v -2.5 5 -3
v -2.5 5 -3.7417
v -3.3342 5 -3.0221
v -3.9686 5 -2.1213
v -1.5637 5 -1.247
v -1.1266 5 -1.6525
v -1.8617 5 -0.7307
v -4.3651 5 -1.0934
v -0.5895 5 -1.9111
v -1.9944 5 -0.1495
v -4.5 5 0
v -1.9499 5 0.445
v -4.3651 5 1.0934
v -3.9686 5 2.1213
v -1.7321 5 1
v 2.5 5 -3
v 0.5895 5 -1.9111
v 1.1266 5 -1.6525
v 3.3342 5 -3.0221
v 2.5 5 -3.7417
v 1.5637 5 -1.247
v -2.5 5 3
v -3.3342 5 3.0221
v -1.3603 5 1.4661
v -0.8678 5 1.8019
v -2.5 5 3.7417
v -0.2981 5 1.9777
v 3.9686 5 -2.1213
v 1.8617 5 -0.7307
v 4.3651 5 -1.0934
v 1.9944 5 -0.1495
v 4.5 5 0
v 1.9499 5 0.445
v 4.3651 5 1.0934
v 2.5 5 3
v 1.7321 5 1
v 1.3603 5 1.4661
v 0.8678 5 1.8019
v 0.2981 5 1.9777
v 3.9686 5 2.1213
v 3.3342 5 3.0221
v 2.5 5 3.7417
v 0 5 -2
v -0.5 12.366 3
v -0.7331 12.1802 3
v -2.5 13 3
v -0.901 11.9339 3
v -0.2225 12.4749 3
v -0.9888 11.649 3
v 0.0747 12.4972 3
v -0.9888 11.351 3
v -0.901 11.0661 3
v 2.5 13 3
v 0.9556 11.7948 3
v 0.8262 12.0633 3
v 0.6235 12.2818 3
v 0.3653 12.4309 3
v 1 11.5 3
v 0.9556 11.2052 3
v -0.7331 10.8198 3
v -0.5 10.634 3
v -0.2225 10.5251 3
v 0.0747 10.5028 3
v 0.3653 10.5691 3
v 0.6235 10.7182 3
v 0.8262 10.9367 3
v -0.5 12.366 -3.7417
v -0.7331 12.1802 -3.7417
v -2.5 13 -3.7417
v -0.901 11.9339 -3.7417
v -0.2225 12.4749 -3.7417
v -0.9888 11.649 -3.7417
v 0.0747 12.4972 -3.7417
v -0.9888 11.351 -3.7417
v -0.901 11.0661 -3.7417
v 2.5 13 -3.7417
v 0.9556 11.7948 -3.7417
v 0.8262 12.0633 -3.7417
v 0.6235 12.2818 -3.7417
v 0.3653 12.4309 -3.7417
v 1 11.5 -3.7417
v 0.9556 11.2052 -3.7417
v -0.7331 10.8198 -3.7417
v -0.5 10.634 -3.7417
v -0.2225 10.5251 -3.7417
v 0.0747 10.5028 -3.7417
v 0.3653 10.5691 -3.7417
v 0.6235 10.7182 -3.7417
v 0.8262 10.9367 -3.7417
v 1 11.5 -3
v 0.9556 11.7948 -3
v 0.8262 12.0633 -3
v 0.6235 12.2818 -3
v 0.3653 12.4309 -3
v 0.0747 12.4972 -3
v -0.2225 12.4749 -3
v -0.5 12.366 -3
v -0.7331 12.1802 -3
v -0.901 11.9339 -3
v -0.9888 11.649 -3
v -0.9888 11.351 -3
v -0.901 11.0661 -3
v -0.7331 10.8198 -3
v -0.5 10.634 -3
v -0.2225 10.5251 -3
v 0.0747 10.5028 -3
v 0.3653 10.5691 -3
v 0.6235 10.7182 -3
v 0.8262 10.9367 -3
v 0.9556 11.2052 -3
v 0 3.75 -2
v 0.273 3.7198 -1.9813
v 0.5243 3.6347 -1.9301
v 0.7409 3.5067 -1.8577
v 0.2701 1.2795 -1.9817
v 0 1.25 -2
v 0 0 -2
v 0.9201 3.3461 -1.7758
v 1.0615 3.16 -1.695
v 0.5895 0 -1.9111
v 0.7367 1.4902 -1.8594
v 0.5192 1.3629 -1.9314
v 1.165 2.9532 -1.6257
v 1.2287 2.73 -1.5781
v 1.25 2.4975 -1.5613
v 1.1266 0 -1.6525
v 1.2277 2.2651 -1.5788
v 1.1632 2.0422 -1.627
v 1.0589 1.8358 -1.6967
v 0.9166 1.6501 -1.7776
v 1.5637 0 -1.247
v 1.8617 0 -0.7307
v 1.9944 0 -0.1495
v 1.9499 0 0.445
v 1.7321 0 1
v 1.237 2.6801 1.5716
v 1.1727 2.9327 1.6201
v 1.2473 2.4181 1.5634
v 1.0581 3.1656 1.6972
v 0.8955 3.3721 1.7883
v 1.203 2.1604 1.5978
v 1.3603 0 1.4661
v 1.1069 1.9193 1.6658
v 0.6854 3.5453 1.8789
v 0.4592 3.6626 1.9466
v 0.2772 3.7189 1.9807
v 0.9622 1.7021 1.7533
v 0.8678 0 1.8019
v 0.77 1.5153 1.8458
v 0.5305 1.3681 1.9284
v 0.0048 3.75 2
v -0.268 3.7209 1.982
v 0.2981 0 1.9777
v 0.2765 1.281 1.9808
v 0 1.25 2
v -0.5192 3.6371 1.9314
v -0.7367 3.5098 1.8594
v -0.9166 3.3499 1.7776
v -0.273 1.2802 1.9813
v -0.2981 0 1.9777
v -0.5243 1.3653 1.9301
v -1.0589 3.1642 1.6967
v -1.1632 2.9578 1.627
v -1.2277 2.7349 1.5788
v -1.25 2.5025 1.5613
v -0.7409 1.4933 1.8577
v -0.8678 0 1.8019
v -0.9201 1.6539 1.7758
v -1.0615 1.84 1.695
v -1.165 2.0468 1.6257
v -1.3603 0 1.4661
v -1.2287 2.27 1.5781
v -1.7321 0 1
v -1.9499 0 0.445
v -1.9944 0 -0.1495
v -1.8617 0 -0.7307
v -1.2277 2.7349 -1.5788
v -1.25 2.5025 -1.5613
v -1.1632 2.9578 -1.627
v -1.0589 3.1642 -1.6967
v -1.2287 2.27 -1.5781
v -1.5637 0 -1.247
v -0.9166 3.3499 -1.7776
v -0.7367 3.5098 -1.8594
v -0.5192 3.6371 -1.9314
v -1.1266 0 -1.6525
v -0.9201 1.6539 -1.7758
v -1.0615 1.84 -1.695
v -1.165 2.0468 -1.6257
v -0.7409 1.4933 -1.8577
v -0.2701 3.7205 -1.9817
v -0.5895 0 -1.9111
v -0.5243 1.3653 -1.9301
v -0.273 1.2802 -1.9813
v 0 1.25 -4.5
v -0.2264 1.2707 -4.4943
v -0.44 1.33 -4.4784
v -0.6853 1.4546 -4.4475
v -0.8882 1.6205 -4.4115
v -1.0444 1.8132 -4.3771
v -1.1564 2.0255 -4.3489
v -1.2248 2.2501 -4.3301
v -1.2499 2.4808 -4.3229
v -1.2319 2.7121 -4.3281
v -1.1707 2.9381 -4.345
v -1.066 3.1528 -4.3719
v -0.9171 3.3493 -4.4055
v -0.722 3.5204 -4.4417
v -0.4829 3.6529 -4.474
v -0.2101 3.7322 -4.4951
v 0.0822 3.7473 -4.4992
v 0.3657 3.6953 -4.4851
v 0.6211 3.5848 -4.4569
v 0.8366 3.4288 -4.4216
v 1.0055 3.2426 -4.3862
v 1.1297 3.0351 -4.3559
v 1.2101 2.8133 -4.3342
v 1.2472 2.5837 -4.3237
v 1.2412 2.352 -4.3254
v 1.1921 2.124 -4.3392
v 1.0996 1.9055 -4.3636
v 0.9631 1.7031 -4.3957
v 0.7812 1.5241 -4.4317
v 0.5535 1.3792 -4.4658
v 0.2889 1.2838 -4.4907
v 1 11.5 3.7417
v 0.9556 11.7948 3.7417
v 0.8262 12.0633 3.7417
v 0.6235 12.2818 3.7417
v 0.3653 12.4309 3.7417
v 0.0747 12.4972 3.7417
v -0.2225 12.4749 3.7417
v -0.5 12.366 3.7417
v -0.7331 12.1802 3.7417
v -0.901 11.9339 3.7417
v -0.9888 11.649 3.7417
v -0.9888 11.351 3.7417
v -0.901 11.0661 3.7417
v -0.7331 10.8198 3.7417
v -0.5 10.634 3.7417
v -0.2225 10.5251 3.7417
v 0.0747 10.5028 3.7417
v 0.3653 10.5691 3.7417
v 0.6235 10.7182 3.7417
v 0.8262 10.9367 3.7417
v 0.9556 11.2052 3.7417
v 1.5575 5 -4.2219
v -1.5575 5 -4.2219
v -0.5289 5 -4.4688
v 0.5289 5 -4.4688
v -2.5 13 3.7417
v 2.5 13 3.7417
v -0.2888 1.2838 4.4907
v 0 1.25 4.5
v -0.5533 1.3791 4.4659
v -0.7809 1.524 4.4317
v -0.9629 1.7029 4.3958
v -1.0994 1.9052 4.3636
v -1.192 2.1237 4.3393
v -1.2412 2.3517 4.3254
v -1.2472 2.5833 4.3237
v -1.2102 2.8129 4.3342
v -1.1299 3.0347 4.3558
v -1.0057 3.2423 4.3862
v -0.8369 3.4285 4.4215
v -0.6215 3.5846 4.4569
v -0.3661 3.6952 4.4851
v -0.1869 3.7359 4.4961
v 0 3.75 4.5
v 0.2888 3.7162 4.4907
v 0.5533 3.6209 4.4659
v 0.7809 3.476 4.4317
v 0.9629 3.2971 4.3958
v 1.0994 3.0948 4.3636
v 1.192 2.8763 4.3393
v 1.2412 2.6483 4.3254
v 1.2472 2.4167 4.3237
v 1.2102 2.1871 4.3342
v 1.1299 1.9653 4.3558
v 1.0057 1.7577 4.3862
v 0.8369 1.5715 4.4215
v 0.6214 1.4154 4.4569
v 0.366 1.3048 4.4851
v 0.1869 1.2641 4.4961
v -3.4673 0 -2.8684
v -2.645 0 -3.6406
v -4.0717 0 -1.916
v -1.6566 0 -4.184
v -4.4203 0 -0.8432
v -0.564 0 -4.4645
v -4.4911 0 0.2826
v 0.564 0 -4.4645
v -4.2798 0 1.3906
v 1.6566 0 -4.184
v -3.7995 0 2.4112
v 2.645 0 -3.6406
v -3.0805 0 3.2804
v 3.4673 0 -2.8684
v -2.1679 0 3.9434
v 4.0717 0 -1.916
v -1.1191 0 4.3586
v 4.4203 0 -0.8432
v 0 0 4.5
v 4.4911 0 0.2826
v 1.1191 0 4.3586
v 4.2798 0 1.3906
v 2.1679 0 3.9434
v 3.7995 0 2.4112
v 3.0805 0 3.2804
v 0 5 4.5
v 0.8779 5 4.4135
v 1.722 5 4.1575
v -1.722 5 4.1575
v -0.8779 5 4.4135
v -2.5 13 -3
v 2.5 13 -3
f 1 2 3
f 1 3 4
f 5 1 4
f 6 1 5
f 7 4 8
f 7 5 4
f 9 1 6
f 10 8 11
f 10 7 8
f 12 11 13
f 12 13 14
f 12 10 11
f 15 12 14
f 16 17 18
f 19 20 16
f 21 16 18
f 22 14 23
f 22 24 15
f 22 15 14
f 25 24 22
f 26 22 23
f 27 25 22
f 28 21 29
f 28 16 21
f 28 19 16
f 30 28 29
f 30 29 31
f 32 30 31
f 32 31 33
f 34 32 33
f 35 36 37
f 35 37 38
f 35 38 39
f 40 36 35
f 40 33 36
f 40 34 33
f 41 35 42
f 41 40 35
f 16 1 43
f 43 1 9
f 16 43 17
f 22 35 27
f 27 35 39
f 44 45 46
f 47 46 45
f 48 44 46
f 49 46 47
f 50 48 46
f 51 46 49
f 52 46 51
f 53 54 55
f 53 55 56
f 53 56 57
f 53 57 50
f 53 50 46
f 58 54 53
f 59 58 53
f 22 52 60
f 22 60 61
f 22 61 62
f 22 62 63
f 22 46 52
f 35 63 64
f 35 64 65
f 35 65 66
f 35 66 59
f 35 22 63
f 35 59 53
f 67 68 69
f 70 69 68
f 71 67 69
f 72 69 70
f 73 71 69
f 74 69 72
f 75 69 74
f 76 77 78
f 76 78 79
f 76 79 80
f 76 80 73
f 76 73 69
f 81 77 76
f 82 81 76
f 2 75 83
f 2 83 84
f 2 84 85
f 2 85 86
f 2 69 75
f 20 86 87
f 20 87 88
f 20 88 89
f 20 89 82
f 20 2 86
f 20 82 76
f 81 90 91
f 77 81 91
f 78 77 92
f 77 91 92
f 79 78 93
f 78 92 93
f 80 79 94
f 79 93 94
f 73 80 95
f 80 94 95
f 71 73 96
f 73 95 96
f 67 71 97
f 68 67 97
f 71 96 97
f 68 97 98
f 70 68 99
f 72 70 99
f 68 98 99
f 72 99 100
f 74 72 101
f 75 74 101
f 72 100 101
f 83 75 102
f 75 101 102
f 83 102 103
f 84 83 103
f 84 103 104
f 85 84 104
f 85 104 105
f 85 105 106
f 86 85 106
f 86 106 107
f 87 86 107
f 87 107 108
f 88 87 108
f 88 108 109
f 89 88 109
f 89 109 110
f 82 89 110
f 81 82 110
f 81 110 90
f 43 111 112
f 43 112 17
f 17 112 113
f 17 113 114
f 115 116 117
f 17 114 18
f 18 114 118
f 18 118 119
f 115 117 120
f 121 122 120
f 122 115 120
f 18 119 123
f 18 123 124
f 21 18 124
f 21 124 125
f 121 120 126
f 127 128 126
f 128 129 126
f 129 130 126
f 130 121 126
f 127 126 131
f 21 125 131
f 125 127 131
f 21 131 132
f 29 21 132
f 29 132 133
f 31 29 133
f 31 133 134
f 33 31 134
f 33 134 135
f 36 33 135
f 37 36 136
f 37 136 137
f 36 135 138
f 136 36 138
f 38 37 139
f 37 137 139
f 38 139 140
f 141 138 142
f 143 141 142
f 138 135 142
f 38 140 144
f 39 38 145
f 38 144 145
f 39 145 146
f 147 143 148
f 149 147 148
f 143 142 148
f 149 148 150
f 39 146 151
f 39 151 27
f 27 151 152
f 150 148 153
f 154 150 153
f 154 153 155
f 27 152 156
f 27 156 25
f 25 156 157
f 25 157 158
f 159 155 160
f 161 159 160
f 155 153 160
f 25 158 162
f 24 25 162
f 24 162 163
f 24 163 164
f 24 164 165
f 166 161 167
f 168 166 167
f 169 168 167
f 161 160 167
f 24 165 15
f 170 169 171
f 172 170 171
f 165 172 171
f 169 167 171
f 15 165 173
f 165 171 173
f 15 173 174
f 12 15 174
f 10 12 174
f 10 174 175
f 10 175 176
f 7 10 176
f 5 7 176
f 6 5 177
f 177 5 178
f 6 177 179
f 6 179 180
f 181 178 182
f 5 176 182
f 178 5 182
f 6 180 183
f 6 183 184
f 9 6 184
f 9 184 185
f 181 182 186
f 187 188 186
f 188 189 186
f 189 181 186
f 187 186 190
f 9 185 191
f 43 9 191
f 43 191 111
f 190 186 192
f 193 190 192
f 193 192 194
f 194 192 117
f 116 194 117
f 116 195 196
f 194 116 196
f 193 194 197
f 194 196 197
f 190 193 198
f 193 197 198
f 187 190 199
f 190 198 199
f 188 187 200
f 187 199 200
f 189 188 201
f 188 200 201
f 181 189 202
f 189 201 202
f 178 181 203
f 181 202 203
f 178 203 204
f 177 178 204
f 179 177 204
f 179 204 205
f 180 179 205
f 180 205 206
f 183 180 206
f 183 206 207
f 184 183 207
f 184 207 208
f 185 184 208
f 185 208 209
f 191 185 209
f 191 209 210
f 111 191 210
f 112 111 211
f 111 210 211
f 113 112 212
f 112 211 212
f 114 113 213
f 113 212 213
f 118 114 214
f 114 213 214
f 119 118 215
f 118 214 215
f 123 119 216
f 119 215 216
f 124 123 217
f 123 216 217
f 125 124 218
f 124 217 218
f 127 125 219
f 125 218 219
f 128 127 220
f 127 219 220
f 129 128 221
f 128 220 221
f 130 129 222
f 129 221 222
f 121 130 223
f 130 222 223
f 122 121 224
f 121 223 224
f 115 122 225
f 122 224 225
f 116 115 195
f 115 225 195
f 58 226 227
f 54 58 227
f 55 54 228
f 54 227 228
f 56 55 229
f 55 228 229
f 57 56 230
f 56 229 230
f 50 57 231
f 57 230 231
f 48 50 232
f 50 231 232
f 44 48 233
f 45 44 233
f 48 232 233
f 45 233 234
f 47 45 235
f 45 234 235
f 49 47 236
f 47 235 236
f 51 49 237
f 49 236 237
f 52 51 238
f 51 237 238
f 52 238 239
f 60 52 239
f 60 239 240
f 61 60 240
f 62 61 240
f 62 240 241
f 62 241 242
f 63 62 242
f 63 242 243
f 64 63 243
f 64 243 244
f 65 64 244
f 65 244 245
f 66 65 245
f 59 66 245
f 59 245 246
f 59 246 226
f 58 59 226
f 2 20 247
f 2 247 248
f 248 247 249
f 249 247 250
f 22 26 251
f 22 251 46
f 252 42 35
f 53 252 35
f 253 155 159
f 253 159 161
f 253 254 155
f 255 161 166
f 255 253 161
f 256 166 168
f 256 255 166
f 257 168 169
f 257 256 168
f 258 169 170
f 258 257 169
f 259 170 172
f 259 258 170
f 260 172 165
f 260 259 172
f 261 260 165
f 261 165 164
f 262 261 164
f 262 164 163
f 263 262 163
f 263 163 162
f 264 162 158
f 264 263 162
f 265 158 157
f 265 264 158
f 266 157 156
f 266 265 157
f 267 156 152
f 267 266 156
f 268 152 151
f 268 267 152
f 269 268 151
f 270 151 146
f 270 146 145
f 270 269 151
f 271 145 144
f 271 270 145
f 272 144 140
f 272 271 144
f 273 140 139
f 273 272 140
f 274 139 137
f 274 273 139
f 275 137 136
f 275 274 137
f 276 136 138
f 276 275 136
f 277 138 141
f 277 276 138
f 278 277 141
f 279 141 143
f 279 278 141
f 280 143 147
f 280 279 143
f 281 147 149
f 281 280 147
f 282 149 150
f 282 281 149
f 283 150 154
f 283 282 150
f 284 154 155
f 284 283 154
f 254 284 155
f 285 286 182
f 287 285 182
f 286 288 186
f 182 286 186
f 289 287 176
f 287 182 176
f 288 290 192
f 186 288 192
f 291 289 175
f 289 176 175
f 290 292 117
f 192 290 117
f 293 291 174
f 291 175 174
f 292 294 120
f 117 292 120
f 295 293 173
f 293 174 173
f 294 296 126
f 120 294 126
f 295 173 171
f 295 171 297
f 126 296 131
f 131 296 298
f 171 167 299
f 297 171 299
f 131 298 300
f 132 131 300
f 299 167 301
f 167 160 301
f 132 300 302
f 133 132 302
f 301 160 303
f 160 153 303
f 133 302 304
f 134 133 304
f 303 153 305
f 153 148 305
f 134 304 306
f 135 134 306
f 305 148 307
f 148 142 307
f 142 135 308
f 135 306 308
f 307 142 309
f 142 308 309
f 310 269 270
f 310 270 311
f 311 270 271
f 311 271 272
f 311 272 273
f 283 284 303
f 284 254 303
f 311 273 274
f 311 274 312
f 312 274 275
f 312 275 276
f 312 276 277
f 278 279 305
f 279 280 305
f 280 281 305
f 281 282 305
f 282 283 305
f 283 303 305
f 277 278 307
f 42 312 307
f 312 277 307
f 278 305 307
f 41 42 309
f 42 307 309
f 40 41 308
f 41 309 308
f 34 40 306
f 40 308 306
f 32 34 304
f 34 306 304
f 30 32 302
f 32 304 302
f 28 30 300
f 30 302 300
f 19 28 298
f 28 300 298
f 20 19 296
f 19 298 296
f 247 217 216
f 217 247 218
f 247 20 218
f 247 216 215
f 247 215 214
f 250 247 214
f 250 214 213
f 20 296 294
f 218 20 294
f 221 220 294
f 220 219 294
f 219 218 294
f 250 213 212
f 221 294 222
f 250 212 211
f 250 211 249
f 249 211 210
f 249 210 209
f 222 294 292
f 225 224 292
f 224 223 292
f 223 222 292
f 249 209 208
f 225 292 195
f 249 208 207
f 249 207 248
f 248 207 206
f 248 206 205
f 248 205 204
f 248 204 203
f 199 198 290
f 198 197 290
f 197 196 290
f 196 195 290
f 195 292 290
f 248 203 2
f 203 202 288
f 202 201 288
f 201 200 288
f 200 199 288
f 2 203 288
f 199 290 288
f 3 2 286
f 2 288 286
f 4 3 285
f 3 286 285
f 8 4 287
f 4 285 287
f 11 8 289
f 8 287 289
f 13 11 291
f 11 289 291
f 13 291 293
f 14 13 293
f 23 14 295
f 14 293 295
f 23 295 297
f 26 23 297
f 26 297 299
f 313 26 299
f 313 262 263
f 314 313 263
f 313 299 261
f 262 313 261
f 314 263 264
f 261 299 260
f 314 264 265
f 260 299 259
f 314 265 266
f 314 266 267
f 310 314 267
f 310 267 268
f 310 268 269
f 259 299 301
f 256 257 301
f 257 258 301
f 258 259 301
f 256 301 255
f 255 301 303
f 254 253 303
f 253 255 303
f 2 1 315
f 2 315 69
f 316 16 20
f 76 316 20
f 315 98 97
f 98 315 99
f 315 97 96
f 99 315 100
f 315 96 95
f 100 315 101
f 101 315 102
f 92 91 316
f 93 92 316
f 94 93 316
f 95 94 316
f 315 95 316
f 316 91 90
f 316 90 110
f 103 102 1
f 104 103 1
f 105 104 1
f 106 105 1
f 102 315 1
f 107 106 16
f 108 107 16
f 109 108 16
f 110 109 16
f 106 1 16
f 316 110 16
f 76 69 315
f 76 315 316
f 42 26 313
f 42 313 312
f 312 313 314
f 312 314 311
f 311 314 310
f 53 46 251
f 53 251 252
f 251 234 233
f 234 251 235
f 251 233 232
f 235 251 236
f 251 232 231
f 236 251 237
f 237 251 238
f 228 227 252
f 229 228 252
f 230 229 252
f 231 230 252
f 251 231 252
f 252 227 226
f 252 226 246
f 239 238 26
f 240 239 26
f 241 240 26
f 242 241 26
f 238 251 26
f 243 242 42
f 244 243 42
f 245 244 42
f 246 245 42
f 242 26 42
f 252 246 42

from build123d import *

# Parameters (mm, degrees)
SKETCH2_R           = 4.5
BOSS_EXTRUDE1_DEPTH = 5
SKETCH3_W           = 5
SKETCH3_H           = 0.741657387
BOSS_EXTRUDE2_DEPTH = 8
CUT_EXTRUDE1_REACH  = 18.037
SKETCH4_R           = 1
SKETCH6_R           = 2
CUT_EXTRUDE2_DEPTH  = 5


with BuildPart() as part:
    # Sketch2 → Boss-Extrude1 (new body)
    with BuildSketch(Plane(origin=(0, 0, 0), x_dir=(1, 0, 0), z_dir=(0, 1, 0))):
        with Locations(Location((0, 0, 0), (0, 0, 270))):
            Circle(SKETCH2_R)
    extrude(amount=BOSS_EXTRUDE1_DEPTH)

    # Sketch3 → Boss-Extrude2 (add)
    with BuildSketch(Plane(origin=(0, 5, 0), x_dir=(1, 0, 0), z_dir=(0, 1, 0))):
        with Locations((0, -3.370828694)):
            Rectangle(SKETCH3_W, SKETCH3_H)
        with Locations((0, 3.370828694)):
            Rectangle(SKETCH3_W, SKETCH3_H)
    extrude(amount=BOSS_EXTRUDE2_DEPTH)

    # Cut-Extrude1: up to this face of the body (flat: up to its plane)
    cut_extrude1_end = Plane(part.part.faces().sort_by_distance((0, 9, -3.741657387))[0])
    # Sketch4 → Cut-Extrude1 (cut, up to the picked face)
    with BuildSketch(Plane.XY.offset(3.741657387), mode=Mode.PRIVATE) as cut_extrude1_sk1:
        with Locations((0, 11.5)):
            Circle(SKETCH4_R)
    cut_extrude1_tool1 = split(extrude(cut_extrude1_sk1.sketch, amount=-CUT_EXTRUDE1_REACH, mode=Mode.PRIVATE), bisect_by=cut_extrude1_end, keep=Keep.BOTH, mode=Mode.PRIVATE)
    add(cut_extrude1_tool1.solids().sort_by(Axis((0, 11.5, 3.741657), (0, 0, -1)))[0], mode=Mode.SUBTRACT)

    # Sketch6 → Cut-Extrude2 (cut)
    with BuildSketch(Plane.XZ):
        with Locations(Location((0, 0, 0), (0, 0, 270))):
            Circle(SKETCH6_R)
    extrude(amount=-CUT_EXTRUDE2_DEPTH, mode=Mode.SUBTRACT)

    # Sketch9 → M3x0.5 Tapped Hole2 (revolve, cut)
    with BuildSketch(Plane(origin=(0, 2.5, 4.5), x_dir=(0, -1, 0), z_dir=(1, 0, 0))):
        Polygon((0, 0), (0, 4.499), (1.25, 3.747924226), (1.25, 0), align=None)
    m3x0_5_tapped_hole2 = revolve(axis=Axis((0, 2.5, 10.85), (0, 0, -1)), mode=Mode.SUBTRACT)

    # Mirror1: M3x0.5 Tapped Hole2 across plane
    add(m3x0_5_tapped_hole2.mirror(Plane.XY), mode=Mode.SUBTRACT)


solid = part.part
